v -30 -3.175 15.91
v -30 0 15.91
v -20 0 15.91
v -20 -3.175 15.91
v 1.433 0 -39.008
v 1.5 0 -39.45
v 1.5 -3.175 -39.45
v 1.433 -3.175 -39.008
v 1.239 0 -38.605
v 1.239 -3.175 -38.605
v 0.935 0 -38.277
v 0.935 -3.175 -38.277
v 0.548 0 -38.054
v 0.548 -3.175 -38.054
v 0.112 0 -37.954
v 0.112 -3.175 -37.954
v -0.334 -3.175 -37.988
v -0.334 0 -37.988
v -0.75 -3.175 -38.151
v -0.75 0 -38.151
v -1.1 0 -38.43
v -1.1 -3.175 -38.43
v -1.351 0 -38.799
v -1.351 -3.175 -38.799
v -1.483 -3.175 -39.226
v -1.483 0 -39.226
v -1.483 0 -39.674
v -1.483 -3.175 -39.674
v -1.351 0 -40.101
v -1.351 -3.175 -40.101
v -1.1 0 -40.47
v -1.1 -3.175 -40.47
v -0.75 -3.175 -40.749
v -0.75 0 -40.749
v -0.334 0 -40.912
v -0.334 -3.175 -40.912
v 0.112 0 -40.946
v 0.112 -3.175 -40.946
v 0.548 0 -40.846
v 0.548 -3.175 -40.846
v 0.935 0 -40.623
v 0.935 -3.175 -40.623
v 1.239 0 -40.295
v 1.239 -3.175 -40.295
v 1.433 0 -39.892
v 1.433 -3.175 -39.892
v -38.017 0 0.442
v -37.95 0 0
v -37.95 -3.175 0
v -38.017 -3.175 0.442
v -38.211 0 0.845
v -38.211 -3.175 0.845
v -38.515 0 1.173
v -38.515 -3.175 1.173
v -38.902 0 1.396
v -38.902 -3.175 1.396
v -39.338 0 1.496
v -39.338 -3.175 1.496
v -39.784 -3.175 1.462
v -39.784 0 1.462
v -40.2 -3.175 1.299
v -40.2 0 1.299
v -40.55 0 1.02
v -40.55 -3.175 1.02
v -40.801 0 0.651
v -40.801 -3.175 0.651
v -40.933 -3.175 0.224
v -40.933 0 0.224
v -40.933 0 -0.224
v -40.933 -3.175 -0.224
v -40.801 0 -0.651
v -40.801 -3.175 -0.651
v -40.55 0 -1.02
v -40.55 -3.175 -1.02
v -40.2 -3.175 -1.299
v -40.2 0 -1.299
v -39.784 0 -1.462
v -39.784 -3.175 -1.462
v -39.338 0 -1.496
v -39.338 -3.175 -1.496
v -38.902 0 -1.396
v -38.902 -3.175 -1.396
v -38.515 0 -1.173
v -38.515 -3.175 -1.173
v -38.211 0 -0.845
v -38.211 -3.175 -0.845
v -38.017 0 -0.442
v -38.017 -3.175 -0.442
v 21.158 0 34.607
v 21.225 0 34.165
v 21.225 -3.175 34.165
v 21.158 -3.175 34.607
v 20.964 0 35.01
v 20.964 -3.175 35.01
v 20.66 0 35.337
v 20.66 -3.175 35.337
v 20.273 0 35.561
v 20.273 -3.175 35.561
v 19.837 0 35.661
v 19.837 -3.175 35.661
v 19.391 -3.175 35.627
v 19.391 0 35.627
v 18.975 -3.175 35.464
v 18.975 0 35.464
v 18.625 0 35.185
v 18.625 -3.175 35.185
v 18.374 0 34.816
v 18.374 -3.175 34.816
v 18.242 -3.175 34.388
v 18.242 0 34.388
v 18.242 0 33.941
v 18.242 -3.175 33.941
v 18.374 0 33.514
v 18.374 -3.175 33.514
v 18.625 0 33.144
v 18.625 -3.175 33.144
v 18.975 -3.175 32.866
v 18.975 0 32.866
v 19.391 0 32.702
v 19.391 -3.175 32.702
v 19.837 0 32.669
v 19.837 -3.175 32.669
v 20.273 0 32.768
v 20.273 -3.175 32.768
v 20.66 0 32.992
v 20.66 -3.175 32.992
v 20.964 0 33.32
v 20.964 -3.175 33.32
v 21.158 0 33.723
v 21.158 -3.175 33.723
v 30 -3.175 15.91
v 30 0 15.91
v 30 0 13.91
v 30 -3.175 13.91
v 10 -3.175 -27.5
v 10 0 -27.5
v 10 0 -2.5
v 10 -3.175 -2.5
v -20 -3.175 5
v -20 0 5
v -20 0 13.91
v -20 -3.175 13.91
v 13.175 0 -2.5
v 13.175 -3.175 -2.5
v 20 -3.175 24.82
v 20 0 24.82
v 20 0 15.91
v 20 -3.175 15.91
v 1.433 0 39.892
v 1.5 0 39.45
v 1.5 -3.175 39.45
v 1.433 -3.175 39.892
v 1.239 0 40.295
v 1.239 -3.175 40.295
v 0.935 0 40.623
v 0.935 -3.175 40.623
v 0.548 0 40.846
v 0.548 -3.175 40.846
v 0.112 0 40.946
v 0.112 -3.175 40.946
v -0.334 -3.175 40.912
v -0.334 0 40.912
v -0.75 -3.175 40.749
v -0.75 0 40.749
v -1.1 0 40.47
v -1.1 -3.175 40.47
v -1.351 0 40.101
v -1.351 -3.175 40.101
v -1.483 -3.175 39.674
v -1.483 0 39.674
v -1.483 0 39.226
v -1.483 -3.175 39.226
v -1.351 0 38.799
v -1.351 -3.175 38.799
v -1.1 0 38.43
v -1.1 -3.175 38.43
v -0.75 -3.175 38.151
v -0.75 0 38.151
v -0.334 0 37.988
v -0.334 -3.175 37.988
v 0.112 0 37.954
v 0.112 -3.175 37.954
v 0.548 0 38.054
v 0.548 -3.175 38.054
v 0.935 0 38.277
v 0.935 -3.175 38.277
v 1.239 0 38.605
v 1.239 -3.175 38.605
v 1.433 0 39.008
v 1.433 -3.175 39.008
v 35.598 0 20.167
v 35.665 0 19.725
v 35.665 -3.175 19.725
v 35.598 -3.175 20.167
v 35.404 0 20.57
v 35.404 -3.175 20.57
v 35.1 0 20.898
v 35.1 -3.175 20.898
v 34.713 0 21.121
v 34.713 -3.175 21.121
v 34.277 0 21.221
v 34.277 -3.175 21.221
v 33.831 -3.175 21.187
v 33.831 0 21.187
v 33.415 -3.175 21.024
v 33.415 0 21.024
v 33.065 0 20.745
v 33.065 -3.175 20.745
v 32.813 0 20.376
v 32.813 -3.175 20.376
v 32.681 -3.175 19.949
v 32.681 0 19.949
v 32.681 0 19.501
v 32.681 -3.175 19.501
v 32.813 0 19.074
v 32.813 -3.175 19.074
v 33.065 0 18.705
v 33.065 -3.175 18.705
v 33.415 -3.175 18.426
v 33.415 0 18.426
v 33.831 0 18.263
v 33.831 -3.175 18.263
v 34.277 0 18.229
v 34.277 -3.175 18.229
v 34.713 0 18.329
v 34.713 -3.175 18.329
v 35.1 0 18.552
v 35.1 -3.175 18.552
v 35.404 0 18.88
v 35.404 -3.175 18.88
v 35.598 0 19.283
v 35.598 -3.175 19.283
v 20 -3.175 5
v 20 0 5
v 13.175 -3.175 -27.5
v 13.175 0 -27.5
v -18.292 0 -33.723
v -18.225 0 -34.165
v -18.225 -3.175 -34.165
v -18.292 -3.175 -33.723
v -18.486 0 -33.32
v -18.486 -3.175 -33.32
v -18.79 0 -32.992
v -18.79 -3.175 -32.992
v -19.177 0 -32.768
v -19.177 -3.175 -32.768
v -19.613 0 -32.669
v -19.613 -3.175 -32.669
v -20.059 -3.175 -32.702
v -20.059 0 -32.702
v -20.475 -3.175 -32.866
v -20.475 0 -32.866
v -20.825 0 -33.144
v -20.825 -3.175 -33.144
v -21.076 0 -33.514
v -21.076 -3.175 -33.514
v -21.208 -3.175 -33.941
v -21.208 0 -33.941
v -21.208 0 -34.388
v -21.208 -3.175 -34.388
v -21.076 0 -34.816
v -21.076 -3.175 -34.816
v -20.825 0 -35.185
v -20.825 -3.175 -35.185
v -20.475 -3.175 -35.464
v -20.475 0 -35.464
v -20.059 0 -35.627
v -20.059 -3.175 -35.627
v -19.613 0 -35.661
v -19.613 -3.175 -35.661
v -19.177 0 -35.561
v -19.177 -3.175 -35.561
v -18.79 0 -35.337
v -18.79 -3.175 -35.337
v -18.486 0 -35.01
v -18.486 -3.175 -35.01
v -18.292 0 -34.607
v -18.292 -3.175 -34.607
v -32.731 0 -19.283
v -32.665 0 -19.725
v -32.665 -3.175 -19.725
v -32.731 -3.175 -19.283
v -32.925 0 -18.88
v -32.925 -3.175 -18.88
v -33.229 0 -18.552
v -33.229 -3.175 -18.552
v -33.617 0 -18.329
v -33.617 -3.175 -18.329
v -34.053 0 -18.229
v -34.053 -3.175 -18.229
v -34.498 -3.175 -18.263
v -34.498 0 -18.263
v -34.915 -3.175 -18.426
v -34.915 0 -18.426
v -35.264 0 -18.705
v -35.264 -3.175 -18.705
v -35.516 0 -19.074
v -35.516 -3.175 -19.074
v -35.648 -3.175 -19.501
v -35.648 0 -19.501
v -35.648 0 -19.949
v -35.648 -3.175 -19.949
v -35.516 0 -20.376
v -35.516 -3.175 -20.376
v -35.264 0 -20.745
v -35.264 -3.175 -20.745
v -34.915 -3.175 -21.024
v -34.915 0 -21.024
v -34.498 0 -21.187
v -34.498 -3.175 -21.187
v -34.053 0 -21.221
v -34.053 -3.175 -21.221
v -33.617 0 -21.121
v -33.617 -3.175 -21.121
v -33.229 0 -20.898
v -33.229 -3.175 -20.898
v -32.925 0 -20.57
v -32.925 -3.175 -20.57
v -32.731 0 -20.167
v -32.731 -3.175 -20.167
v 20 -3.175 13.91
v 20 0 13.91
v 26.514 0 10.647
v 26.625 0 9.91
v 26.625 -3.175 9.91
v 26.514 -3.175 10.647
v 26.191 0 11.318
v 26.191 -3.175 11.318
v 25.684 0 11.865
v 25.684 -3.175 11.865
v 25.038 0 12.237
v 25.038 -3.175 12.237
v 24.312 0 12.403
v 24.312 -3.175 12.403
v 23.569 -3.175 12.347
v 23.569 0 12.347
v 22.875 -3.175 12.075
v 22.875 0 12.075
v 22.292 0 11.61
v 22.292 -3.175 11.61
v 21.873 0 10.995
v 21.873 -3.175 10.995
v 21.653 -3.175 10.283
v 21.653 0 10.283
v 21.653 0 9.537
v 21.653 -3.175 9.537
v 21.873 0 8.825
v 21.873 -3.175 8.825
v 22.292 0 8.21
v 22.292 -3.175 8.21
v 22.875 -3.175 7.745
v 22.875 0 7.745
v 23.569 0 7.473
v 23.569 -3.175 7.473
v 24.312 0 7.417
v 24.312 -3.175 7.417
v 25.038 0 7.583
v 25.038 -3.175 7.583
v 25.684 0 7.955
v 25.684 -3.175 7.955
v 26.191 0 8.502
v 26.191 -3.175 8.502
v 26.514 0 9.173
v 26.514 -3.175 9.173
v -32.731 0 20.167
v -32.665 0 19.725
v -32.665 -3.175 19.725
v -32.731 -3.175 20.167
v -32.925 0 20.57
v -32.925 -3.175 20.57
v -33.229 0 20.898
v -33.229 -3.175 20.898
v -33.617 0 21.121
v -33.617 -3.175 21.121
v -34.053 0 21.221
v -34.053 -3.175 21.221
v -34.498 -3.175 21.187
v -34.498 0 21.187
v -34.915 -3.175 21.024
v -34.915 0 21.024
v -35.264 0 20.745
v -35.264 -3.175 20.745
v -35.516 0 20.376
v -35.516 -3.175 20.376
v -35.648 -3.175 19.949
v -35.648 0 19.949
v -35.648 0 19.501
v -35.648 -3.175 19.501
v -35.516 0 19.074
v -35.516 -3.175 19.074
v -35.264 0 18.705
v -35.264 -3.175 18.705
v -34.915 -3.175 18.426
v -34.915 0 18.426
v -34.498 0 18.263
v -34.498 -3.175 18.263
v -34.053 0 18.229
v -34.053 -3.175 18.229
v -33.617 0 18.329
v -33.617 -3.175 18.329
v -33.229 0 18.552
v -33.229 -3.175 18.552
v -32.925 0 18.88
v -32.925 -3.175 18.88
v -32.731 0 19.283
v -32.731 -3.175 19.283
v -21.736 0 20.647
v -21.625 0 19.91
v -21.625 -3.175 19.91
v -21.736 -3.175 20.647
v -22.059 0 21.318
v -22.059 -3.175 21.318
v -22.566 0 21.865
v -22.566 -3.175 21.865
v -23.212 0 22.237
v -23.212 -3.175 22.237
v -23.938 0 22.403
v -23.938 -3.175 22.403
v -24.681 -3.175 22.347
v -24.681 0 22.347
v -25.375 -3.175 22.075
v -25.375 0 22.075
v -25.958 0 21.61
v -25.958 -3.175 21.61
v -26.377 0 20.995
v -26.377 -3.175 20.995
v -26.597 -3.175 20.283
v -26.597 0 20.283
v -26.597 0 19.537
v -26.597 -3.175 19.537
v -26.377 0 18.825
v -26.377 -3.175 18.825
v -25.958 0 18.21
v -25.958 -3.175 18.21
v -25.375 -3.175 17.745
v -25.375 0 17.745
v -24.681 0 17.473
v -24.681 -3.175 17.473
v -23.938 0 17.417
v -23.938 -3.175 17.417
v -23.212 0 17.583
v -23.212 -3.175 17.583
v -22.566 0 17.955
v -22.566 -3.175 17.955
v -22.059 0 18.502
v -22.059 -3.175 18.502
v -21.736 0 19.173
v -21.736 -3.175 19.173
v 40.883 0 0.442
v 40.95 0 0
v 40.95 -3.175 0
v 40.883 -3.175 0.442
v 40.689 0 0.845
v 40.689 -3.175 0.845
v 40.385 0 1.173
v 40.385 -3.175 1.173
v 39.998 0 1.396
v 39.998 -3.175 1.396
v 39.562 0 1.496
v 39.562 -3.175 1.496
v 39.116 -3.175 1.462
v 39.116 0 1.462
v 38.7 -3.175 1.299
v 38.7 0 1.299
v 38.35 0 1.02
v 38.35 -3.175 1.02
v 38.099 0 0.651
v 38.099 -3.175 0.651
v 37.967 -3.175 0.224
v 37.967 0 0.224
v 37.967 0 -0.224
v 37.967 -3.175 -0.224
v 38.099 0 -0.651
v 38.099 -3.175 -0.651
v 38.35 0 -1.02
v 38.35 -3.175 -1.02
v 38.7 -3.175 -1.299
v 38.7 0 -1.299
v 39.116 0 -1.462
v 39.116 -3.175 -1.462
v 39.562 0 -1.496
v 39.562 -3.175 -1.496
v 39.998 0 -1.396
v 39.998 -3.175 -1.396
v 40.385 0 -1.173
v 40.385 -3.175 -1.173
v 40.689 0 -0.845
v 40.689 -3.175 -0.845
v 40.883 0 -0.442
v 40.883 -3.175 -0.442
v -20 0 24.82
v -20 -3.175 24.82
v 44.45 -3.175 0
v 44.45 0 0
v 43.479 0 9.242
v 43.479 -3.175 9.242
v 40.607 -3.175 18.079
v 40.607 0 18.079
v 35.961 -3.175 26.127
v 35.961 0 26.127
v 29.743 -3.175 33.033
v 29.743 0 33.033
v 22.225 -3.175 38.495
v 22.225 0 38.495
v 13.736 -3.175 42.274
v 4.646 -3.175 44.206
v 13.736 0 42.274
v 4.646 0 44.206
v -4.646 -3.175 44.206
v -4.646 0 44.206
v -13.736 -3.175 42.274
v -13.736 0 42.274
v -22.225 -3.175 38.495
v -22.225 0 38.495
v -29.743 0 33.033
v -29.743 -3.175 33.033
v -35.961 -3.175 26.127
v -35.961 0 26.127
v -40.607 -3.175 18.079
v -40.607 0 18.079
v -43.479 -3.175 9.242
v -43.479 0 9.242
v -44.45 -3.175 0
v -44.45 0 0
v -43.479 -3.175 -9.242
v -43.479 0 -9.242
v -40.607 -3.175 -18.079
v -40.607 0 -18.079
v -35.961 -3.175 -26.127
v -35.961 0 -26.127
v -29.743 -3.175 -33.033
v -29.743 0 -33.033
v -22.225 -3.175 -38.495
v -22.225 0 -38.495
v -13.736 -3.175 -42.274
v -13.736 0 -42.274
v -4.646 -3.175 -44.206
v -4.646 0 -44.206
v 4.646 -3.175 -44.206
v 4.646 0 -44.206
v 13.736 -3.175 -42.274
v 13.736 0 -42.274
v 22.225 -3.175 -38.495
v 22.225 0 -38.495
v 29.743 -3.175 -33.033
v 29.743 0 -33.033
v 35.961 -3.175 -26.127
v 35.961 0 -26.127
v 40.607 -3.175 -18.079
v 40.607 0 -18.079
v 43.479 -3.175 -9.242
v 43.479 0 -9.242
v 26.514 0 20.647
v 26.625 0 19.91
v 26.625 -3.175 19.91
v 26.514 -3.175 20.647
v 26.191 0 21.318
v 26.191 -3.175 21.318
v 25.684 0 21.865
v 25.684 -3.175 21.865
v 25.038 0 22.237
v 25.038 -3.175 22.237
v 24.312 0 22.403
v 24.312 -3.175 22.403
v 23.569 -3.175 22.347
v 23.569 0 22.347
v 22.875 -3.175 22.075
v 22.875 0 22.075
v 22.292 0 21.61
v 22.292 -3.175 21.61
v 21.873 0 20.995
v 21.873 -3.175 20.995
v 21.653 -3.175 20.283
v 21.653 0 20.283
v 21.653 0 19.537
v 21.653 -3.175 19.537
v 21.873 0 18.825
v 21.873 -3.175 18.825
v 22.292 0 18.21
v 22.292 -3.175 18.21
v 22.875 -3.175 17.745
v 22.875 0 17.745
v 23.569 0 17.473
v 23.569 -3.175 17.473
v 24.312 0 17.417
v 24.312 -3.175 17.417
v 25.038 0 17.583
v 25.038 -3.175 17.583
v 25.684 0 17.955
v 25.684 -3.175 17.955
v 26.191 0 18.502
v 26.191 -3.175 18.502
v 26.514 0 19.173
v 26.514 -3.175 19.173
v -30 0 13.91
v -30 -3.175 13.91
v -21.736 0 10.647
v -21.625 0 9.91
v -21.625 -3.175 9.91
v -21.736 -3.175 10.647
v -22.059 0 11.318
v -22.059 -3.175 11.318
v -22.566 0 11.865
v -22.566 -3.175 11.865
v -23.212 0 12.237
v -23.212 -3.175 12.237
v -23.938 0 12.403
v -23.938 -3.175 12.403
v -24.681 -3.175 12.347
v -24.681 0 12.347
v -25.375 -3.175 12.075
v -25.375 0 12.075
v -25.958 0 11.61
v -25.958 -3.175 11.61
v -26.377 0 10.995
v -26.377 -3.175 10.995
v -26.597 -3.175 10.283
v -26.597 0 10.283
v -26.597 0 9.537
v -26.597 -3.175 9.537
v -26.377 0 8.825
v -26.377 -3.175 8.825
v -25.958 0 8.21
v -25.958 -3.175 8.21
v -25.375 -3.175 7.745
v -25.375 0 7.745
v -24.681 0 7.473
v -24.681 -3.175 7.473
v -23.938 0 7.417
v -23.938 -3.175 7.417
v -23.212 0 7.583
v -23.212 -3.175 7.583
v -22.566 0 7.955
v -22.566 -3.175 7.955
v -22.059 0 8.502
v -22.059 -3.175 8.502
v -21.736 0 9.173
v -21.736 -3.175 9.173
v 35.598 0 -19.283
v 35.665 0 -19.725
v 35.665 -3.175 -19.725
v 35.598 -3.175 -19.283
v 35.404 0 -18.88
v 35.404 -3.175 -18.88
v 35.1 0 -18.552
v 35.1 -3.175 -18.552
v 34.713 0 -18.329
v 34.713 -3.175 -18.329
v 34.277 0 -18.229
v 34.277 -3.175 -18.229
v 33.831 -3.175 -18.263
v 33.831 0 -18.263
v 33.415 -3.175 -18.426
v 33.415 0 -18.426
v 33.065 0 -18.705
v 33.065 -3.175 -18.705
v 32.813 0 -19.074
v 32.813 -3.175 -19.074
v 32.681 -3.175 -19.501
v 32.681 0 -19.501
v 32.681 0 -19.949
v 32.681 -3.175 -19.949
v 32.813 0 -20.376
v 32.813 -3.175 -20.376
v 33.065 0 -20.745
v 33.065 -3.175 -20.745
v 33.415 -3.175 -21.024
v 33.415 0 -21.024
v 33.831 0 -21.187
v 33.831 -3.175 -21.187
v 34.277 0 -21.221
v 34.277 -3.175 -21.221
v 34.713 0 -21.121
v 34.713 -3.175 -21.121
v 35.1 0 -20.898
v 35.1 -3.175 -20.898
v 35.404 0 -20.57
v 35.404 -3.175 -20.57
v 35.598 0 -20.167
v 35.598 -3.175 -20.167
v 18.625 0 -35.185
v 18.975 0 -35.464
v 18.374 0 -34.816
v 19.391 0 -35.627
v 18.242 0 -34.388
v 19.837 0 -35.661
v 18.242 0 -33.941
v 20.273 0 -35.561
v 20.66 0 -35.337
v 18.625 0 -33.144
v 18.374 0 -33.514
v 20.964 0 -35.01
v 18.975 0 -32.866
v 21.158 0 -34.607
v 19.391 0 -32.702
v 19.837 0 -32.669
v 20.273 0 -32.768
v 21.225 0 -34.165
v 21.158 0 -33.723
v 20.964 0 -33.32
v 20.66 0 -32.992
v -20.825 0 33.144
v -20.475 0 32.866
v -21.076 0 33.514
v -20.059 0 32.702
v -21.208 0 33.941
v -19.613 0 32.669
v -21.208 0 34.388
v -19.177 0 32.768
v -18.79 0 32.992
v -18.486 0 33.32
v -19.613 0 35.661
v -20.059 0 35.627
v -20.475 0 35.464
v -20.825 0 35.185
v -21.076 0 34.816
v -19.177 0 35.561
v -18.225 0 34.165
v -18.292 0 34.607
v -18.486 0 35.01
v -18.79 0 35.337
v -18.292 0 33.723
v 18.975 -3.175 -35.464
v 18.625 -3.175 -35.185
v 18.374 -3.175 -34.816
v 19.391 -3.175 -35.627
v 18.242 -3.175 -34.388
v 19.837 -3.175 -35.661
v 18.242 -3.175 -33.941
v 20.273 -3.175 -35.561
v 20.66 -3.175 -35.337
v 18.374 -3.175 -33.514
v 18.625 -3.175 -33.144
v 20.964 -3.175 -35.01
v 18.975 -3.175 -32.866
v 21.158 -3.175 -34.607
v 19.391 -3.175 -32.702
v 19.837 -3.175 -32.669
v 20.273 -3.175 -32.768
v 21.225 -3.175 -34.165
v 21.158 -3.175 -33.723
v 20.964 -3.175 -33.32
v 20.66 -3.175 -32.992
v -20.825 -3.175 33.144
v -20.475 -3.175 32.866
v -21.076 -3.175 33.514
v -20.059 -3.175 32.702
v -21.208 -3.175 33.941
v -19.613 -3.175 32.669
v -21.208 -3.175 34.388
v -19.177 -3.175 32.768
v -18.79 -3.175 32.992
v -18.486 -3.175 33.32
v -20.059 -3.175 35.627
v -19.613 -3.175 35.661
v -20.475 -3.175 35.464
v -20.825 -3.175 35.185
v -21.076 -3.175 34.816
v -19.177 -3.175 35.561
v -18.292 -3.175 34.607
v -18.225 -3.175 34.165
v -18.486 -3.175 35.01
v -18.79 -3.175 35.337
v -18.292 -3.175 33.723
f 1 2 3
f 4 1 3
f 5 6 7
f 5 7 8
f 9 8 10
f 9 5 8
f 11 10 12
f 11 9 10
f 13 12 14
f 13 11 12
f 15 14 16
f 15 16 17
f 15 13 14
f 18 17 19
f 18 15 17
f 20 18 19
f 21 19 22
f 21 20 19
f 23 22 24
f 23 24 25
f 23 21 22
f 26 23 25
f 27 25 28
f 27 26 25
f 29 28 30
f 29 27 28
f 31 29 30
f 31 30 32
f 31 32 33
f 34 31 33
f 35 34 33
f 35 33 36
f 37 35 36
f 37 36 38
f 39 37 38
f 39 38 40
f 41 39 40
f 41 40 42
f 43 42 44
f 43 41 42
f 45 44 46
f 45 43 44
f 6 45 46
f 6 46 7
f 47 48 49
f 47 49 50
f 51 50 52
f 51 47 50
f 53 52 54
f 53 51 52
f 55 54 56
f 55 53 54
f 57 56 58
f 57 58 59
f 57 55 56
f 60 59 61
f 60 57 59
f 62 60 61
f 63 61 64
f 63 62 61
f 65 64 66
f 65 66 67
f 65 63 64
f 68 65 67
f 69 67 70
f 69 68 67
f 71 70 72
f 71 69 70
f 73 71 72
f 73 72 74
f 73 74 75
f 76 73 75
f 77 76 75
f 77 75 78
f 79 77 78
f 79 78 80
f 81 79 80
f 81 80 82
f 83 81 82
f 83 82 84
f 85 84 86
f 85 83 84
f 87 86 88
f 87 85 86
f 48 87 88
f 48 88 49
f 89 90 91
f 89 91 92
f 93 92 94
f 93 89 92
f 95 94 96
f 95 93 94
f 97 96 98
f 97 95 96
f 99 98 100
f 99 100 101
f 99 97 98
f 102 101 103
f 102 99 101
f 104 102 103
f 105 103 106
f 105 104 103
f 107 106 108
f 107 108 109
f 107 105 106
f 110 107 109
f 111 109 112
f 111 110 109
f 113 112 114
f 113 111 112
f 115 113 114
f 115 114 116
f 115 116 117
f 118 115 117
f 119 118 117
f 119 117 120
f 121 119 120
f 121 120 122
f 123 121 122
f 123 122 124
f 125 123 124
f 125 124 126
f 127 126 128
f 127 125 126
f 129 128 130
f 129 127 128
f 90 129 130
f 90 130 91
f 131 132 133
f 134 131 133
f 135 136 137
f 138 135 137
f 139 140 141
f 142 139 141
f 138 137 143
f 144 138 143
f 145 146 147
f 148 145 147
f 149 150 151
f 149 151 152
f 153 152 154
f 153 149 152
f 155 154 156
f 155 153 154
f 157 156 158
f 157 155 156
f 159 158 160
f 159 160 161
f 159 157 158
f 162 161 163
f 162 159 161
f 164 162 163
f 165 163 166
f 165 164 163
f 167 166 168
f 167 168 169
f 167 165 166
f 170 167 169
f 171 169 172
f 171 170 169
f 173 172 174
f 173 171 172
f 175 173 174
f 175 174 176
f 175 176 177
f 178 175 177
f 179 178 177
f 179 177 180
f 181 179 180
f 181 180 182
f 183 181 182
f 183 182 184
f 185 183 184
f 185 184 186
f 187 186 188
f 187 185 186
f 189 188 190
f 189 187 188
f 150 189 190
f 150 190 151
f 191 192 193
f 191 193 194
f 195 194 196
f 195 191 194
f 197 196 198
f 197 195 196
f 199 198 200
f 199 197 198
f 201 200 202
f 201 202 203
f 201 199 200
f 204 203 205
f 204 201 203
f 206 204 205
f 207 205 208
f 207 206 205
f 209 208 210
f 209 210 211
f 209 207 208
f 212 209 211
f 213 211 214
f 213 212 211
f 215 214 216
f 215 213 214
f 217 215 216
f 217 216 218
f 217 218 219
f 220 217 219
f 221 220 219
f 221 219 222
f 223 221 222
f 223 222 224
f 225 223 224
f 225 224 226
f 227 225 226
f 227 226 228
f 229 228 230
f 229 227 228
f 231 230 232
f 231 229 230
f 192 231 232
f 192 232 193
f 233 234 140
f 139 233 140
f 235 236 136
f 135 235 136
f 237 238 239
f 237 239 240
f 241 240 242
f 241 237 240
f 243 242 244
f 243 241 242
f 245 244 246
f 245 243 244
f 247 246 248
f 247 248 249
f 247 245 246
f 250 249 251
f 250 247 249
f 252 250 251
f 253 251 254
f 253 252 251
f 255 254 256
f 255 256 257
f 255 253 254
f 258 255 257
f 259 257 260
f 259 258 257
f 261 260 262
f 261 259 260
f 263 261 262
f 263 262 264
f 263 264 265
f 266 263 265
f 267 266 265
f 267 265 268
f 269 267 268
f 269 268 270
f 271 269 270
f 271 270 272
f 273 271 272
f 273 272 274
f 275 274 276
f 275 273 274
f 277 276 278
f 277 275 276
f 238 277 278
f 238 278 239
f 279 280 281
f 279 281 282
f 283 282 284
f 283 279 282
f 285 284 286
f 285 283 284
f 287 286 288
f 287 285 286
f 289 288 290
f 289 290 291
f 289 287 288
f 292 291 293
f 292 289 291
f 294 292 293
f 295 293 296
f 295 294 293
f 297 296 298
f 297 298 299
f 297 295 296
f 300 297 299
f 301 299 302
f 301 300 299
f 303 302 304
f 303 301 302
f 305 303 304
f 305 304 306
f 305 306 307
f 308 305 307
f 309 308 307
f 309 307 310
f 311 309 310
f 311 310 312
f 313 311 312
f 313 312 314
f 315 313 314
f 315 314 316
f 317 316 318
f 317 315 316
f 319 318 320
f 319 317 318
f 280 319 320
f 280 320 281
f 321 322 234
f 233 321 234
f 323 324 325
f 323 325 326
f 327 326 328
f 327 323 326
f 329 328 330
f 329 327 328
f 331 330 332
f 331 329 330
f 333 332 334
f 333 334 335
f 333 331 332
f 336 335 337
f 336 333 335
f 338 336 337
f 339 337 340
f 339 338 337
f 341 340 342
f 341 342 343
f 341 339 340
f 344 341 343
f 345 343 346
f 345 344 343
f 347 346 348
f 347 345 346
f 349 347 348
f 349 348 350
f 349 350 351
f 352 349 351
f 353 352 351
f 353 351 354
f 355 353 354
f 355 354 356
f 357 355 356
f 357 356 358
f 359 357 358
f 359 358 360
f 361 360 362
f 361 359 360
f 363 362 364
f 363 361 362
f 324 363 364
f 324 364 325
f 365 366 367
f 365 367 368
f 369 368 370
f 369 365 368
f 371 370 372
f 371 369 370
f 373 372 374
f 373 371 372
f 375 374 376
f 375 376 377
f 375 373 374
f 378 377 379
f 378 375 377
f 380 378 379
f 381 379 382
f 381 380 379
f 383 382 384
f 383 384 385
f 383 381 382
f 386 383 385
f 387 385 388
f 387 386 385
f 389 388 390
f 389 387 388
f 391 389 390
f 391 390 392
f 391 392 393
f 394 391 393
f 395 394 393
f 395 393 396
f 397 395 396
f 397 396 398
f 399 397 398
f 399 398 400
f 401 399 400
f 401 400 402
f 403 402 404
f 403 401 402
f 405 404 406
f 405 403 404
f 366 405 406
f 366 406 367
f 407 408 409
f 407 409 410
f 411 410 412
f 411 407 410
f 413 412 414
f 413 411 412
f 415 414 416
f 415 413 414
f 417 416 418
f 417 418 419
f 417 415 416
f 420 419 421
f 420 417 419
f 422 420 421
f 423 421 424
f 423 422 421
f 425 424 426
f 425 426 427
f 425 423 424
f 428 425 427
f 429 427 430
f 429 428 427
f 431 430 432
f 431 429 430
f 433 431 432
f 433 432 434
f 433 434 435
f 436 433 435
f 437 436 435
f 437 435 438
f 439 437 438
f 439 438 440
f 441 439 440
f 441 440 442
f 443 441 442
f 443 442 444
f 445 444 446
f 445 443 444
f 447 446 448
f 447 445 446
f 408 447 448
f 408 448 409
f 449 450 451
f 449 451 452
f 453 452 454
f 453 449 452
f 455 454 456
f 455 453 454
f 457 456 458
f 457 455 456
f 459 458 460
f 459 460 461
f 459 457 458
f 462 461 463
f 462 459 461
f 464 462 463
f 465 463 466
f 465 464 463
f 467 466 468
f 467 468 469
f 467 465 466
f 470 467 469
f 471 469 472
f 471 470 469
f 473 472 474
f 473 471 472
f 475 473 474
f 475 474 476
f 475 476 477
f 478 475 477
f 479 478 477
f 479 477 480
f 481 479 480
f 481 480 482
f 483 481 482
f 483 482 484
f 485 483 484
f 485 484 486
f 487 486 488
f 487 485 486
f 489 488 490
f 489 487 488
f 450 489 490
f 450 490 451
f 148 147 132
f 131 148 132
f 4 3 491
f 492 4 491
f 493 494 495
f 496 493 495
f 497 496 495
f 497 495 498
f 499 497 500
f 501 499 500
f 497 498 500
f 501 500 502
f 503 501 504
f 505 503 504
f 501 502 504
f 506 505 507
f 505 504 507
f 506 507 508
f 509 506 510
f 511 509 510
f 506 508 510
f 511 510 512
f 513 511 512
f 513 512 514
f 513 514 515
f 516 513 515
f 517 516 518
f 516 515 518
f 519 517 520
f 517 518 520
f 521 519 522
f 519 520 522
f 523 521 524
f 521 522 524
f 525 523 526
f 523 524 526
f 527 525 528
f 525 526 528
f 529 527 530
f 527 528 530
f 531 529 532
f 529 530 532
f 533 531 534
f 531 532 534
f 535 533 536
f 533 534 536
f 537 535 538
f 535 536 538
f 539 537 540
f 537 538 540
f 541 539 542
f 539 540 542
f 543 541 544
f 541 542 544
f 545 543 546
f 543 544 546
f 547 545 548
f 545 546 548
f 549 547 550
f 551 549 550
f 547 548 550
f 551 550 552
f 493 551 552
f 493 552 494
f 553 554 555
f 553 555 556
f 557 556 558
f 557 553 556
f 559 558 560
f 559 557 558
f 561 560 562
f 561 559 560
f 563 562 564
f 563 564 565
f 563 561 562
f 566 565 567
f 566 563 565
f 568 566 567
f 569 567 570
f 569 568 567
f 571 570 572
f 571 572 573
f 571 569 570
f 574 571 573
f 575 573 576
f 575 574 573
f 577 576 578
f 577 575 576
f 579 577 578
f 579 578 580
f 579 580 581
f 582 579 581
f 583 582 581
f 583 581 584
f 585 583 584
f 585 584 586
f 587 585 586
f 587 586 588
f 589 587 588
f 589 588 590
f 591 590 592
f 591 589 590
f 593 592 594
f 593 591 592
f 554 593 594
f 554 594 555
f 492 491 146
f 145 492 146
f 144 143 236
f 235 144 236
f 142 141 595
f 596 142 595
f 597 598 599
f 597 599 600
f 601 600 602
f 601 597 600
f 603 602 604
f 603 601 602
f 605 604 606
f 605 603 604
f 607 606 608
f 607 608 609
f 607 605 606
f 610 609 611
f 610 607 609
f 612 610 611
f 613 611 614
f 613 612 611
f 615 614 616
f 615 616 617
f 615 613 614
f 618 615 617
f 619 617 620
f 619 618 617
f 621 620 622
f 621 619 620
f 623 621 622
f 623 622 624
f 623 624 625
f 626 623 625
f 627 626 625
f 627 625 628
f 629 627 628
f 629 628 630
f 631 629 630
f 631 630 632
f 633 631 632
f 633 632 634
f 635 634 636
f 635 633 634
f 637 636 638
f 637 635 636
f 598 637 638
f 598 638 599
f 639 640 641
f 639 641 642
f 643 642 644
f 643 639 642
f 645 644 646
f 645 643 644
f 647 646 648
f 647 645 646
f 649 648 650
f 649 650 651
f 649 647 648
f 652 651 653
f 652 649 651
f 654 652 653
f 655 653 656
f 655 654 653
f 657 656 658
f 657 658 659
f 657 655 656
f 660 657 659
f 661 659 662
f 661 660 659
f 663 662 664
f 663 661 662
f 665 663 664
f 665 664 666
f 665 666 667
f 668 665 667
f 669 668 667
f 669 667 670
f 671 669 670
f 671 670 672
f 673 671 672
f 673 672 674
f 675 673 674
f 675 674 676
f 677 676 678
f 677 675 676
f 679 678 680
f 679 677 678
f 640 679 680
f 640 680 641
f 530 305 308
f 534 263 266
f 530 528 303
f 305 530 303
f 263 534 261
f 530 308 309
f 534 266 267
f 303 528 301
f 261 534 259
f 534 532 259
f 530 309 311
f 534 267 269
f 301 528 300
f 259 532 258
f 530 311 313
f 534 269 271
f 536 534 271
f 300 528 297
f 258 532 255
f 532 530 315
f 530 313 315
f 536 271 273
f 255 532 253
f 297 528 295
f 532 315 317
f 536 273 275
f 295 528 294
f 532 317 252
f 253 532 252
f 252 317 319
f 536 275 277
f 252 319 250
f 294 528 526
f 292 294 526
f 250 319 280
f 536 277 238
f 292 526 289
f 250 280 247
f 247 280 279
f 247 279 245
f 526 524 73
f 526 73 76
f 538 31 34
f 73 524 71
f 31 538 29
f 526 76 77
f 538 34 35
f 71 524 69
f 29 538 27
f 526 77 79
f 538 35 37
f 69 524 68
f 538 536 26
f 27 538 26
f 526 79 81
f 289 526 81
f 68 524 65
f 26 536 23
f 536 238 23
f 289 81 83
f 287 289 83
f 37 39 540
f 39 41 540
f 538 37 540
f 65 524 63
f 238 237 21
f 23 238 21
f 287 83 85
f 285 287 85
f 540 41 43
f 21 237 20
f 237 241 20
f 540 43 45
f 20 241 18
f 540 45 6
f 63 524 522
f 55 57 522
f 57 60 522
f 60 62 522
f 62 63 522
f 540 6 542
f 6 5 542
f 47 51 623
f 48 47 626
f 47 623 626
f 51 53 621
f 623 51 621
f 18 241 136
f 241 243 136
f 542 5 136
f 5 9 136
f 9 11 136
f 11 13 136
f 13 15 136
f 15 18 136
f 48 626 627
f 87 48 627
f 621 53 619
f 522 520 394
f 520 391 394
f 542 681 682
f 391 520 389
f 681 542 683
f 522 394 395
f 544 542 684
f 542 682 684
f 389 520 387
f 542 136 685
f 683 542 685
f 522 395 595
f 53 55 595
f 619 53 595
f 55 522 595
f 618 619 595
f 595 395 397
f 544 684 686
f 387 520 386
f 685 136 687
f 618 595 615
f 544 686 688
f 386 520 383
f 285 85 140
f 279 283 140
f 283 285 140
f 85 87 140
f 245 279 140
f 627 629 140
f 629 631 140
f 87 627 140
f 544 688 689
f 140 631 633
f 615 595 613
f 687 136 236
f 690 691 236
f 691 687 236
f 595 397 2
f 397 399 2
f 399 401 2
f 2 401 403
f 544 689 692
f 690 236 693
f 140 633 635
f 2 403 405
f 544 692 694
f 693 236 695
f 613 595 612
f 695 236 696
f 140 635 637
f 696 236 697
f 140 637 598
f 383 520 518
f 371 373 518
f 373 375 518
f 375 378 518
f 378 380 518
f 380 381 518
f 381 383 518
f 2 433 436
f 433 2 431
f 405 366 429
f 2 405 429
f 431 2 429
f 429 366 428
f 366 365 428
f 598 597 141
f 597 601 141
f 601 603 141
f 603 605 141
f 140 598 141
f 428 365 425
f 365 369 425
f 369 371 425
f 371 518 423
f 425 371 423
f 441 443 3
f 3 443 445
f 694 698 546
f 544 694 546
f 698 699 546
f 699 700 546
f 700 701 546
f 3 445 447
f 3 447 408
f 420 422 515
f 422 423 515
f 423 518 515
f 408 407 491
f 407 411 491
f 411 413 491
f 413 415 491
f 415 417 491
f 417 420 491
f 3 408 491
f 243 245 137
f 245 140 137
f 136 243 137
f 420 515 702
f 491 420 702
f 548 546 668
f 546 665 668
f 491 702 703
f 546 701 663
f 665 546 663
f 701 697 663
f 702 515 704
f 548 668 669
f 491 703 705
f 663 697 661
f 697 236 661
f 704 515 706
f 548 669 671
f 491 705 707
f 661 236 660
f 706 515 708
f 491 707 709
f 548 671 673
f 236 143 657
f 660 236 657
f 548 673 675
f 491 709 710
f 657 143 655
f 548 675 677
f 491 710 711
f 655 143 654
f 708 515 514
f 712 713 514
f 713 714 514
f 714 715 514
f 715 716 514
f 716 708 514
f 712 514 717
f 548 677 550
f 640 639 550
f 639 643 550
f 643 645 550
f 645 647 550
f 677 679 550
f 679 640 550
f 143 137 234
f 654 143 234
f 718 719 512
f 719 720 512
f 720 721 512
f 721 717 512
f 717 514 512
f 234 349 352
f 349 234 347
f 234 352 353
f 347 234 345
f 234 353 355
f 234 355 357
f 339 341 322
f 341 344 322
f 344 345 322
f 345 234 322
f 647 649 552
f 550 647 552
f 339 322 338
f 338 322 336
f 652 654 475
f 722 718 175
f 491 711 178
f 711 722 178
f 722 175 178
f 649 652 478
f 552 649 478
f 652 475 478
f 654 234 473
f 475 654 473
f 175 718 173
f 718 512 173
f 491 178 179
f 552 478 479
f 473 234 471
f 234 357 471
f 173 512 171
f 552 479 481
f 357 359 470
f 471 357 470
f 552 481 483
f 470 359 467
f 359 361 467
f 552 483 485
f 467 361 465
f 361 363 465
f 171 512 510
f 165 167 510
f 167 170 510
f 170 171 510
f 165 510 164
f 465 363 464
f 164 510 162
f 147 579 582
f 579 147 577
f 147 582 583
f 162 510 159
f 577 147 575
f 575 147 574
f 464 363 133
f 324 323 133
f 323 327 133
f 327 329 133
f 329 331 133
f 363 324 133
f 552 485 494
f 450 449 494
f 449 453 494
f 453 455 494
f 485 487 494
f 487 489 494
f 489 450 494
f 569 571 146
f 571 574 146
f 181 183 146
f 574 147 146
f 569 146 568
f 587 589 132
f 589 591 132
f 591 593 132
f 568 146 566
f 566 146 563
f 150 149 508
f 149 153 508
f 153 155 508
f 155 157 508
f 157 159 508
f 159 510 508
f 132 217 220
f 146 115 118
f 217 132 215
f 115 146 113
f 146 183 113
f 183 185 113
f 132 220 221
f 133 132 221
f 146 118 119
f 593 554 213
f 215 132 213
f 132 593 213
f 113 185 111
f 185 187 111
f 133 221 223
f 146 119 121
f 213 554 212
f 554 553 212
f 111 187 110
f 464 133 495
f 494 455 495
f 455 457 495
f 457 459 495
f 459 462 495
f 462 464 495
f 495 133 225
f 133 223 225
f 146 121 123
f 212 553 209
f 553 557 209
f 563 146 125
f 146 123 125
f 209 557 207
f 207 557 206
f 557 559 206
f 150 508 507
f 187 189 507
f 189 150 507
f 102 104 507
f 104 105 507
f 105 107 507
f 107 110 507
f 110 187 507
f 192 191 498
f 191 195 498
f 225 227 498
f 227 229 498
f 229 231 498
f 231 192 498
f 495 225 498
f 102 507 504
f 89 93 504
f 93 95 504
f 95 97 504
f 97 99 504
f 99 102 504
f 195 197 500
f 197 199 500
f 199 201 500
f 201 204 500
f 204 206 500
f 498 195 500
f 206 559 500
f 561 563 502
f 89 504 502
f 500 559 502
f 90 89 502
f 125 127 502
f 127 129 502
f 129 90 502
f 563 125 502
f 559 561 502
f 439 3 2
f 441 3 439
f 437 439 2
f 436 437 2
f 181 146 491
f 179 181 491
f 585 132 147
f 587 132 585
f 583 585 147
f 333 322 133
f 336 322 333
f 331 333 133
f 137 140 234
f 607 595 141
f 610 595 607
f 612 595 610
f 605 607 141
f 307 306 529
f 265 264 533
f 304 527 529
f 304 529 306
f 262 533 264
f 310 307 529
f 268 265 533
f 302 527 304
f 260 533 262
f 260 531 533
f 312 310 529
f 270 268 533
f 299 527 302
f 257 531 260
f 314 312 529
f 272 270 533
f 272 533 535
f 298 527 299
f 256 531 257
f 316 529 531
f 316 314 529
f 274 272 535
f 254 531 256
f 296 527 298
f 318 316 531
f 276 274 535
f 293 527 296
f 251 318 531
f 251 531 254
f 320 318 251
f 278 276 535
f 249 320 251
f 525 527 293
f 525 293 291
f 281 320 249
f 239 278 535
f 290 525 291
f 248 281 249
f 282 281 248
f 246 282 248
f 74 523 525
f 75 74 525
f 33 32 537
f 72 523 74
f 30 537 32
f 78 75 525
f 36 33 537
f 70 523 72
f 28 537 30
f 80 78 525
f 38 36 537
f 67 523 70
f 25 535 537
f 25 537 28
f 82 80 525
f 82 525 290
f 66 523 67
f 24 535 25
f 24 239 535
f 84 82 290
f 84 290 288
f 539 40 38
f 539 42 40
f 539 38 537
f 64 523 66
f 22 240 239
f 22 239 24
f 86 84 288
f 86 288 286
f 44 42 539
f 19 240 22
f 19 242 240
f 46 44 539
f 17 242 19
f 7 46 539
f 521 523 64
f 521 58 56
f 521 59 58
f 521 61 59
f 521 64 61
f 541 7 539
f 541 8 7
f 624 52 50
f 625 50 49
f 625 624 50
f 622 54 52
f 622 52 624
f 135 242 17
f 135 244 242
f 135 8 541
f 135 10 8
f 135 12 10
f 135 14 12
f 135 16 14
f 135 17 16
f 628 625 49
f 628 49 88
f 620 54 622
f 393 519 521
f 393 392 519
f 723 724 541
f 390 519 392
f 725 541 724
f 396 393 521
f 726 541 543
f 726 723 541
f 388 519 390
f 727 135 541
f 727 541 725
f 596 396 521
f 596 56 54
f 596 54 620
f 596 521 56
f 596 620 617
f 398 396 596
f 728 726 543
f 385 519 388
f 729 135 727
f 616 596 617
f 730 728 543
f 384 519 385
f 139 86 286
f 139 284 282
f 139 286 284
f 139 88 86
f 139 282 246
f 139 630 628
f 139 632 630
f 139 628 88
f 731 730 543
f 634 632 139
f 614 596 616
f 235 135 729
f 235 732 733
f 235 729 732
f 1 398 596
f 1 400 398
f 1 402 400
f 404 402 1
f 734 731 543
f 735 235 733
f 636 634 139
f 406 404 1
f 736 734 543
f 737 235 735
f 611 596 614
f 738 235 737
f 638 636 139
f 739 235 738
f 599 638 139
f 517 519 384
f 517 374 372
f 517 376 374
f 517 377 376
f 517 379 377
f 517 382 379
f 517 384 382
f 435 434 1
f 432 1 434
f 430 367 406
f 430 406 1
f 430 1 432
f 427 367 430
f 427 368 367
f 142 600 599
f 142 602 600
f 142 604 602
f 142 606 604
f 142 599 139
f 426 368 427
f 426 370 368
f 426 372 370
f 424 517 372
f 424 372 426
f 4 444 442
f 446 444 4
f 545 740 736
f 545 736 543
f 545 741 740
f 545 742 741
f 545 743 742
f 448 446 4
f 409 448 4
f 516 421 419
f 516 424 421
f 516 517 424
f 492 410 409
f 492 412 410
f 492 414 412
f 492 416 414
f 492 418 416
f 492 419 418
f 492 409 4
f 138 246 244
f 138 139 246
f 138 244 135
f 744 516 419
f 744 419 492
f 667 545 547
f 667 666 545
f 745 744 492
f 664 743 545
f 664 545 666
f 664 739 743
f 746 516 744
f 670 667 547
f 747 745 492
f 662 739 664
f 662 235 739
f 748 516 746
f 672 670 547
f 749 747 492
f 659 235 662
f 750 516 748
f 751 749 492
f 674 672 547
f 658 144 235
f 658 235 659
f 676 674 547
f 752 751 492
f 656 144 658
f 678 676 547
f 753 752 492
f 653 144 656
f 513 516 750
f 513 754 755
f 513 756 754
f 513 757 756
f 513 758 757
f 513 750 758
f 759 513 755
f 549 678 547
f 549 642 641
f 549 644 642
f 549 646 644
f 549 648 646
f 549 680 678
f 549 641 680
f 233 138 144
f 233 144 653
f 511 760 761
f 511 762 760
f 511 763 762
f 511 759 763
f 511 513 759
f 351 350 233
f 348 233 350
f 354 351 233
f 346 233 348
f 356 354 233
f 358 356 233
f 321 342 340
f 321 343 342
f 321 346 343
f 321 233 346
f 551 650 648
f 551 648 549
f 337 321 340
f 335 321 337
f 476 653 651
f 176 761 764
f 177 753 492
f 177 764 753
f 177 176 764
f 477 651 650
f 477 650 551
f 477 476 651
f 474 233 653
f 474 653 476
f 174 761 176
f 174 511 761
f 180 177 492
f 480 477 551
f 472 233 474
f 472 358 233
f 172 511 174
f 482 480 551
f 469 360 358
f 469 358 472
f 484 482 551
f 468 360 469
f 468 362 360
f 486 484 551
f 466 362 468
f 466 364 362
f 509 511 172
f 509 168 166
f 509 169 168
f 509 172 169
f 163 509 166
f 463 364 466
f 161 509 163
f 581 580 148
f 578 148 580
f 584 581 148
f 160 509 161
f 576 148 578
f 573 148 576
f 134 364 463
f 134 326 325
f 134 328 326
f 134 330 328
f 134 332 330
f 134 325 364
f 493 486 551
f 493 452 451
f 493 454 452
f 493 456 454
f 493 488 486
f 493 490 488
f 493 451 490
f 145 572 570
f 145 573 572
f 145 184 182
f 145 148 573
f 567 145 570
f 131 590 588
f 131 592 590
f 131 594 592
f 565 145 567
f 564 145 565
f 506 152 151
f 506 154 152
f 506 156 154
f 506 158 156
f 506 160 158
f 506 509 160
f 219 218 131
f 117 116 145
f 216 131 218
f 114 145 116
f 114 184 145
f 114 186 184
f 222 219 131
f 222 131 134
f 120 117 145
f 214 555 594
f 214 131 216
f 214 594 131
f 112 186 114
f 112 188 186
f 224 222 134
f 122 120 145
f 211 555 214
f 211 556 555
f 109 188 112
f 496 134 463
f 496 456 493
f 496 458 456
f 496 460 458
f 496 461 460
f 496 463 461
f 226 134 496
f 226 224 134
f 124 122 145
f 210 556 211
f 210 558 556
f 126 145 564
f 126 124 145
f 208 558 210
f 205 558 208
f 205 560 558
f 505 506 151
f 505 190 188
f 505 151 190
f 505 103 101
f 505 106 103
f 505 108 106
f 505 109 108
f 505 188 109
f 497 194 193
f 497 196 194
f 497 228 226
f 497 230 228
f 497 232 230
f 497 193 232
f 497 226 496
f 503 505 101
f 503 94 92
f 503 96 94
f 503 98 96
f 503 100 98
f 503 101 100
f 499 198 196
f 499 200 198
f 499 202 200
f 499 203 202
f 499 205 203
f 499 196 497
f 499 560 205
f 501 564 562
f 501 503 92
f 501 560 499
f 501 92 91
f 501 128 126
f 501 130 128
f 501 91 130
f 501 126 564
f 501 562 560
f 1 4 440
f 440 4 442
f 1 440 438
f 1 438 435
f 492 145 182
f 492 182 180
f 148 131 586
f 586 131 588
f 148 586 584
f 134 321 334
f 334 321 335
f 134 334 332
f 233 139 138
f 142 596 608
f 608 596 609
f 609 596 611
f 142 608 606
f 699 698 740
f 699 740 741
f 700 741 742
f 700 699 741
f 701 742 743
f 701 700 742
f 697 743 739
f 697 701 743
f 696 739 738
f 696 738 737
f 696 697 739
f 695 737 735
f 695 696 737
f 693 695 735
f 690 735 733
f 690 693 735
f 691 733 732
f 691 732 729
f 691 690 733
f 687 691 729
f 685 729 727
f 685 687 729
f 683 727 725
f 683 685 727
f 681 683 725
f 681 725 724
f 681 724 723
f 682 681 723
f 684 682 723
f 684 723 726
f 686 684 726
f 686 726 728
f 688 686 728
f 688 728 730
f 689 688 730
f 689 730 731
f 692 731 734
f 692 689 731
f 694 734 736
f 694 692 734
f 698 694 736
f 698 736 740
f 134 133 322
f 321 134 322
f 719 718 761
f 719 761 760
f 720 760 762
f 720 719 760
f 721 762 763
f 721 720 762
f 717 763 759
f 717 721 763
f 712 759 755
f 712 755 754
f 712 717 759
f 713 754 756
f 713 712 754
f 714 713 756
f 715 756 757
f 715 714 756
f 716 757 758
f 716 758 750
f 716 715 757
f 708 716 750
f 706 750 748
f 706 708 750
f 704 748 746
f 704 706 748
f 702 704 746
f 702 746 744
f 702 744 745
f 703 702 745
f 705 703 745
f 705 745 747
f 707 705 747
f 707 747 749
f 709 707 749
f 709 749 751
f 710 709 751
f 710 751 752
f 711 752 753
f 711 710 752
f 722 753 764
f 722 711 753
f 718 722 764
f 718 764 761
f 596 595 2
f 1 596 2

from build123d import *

# Parameters (mm, degrees)
F0_R     = 44.45
F0_R_2   = 1.5
F0_R_3   = 2.5
F1_DEPTH = 3.175


# Not quite as in the source:
# - a length typed as a fraction of an inch, garbled in the dataset ("3 / 203.2 mm" for 3/8 in), is restored


with BuildPart() as f1:
    # F0 (on Front) → F1 (new body)
    with BuildSketch(Plane.XZ):
        Circle(F0_R)
        with Locations((-19.725, -34.1647021793)):
            Circle(F0_R_2, mode=Mode.SUBTRACT)
        with Locations((-34.1647021793, -19.725)):
            Circle(F0_R_2, mode=Mode.SUBTRACT)
        with Locations((0, -39.45)):
            Circle(F0_R_2, mode=Mode.SUBTRACT)
        with Locations((19.725, -34.1647021793)):
            Circle(F0_R_2, mode=Mode.SUBTRACT)
        Polygon((10, -27.5), (10, -15), (10, -2.5), (13.175, -2.5), (13.175, -15), (13.175, -27.5), align=None, mode=Mode.SUBTRACT)
        with Locations((34.1647021793, -19.725)):
            Circle(F0_R_2, mode=Mode.SUBTRACT)
        with Locations((-39.45, 0)):
            Circle(F0_R_2, mode=Mode.SUBTRACT)
        with Locations((-24.125, 9.91)):
            Circle(F0_R_3, mode=Mode.SUBTRACT)
        with Locations((-34.1647021793, 19.725)):
            Circle(F0_R_2, mode=Mode.SUBTRACT)
        with Locations((-24.125, 19.91)):
            Circle(F0_R_3, mode=Mode.SUBTRACT)
        with Locations((-19.725, 34.1647021793)):
            Circle(F0_R_2, mode=Mode.SUBTRACT)
        Polygon((-20, 15.91), (-20, 24.82), (20, 24.82), (20, 15.91), (30, 15.91), (30, 13.91), (20, 13.91), (20, 5), (-20, 5), (-20, 13.91), (-30, 13.91), (-30, 15.91), align=None, mode=Mode.SUBTRACT)
        with Locations((24.125, 9.91)):
            Circle(F0_R_3, mode=Mode.SUBTRACT)
        with Locations((39.45, 0)):
            Circle(F0_R_2, mode=Mode.SUBTRACT)
        with Locations((24.125, 19.91)):
            Circle(F0_R_3, mode=Mode.SUBTRACT)
        with Locations((34.1647021793, 19.725)):
            Circle(F0_R_2, mode=Mode.SUBTRACT)
        with Locations((0, 39.45)):
            Circle(F0_R_2, mode=Mode.SUBTRACT)
        with Locations((19.725, 34.1647021793)):
            Circle(F0_R_2, mode=Mode.SUBTRACT)
    extrude(amount=F1_DEPTH)


solid = f1.part
